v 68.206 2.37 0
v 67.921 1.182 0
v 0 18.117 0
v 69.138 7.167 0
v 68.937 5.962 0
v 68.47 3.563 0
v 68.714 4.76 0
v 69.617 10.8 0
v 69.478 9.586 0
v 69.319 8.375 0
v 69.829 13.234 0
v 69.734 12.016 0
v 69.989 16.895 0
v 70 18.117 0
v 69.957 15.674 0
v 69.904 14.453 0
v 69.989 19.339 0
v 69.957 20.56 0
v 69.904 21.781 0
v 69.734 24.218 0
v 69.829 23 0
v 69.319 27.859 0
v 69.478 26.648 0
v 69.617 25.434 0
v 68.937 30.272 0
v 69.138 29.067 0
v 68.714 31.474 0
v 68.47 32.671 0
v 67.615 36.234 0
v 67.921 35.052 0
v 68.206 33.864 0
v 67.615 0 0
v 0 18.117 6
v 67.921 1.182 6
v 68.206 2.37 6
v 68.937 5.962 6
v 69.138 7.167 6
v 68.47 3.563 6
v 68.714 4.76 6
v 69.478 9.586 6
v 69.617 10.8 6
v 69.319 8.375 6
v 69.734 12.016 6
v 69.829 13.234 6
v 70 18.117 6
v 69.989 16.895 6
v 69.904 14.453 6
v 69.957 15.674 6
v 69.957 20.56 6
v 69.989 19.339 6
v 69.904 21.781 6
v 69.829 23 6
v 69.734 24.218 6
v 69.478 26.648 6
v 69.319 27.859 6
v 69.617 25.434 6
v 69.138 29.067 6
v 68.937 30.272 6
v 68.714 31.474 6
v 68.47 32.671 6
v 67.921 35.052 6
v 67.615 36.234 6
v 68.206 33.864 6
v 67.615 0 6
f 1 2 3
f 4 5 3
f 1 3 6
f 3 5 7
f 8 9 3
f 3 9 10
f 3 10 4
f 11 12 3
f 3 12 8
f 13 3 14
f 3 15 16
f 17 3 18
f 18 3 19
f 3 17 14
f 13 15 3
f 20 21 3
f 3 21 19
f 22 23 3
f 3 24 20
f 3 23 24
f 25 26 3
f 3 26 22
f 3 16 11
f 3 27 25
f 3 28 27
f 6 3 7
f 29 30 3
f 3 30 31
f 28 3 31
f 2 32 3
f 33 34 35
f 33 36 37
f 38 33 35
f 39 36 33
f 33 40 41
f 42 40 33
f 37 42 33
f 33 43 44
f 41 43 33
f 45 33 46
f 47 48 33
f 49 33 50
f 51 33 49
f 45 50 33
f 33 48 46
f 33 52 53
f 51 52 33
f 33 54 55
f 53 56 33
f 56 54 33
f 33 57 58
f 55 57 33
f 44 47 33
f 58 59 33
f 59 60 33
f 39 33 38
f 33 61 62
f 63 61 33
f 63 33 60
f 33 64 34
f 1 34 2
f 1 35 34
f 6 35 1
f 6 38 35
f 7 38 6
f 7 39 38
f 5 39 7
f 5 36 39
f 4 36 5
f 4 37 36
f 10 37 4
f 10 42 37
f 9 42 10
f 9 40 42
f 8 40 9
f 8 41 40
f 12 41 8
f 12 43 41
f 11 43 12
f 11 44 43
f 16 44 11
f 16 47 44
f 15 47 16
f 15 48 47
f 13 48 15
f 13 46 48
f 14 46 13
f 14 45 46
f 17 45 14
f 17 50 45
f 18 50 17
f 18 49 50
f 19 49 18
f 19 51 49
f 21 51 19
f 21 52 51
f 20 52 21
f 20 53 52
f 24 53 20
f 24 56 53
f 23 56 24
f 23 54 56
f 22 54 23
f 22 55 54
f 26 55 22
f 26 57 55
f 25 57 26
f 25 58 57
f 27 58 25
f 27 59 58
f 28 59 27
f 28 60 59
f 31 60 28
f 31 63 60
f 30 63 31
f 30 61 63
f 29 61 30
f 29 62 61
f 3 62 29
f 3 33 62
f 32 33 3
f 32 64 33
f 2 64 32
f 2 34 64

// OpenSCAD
$fn = 32;

// ----------------------------------------------------------------------
// Arc profile plate: sector, 32 points
// ----------------------------------------------------------------------

// --- parameters (mm) ---
sector_angle = 30;        // sector angle, degrees
sector_r = 70;            // outer radius
arc_step = 1;             // sampling step of the arc, degrees
plate_t = 6;              // plate thickness, Z

bbox_x = 2 * sector_r * sin(sector_angle / 2);  // chord of the sector
bbox_y = sector_r;  // depth of the sector (apex to arc)

profile = [[67.615, 0], [67.921, 1.182], [68.206, 2.37], [68.47, 3.563], [68.714, 4.76], [68.937, 5.962], [69.138, 7.167], [69.319, 8.375], [69.478, 9.586], [69.617, 10.8], [69.734, 12.016], [69.829, 13.234], [69.904, 14.453], [69.957, 15.674], [69.989, 16.895], [70, 18.117], [69.989, 19.339], [69.957, 20.56], [69.904, 21.781], [69.829, 23], [69.734, 24.218], [69.617, 25.434], [69.478, 26.648], [69.319, 27.859], [69.138, 29.067], [68.937, 30.272], [68.714, 31.474], [68.47, 32.671], [68.206, 33.864], [67.921, 35.052], [67.615, 36.234], [0, 18.117]];  // primary outline, 32 points, counter clockwise

// --- the one profile operation ---
linear_extrude(height = plate_t) polygon(points = profile);
